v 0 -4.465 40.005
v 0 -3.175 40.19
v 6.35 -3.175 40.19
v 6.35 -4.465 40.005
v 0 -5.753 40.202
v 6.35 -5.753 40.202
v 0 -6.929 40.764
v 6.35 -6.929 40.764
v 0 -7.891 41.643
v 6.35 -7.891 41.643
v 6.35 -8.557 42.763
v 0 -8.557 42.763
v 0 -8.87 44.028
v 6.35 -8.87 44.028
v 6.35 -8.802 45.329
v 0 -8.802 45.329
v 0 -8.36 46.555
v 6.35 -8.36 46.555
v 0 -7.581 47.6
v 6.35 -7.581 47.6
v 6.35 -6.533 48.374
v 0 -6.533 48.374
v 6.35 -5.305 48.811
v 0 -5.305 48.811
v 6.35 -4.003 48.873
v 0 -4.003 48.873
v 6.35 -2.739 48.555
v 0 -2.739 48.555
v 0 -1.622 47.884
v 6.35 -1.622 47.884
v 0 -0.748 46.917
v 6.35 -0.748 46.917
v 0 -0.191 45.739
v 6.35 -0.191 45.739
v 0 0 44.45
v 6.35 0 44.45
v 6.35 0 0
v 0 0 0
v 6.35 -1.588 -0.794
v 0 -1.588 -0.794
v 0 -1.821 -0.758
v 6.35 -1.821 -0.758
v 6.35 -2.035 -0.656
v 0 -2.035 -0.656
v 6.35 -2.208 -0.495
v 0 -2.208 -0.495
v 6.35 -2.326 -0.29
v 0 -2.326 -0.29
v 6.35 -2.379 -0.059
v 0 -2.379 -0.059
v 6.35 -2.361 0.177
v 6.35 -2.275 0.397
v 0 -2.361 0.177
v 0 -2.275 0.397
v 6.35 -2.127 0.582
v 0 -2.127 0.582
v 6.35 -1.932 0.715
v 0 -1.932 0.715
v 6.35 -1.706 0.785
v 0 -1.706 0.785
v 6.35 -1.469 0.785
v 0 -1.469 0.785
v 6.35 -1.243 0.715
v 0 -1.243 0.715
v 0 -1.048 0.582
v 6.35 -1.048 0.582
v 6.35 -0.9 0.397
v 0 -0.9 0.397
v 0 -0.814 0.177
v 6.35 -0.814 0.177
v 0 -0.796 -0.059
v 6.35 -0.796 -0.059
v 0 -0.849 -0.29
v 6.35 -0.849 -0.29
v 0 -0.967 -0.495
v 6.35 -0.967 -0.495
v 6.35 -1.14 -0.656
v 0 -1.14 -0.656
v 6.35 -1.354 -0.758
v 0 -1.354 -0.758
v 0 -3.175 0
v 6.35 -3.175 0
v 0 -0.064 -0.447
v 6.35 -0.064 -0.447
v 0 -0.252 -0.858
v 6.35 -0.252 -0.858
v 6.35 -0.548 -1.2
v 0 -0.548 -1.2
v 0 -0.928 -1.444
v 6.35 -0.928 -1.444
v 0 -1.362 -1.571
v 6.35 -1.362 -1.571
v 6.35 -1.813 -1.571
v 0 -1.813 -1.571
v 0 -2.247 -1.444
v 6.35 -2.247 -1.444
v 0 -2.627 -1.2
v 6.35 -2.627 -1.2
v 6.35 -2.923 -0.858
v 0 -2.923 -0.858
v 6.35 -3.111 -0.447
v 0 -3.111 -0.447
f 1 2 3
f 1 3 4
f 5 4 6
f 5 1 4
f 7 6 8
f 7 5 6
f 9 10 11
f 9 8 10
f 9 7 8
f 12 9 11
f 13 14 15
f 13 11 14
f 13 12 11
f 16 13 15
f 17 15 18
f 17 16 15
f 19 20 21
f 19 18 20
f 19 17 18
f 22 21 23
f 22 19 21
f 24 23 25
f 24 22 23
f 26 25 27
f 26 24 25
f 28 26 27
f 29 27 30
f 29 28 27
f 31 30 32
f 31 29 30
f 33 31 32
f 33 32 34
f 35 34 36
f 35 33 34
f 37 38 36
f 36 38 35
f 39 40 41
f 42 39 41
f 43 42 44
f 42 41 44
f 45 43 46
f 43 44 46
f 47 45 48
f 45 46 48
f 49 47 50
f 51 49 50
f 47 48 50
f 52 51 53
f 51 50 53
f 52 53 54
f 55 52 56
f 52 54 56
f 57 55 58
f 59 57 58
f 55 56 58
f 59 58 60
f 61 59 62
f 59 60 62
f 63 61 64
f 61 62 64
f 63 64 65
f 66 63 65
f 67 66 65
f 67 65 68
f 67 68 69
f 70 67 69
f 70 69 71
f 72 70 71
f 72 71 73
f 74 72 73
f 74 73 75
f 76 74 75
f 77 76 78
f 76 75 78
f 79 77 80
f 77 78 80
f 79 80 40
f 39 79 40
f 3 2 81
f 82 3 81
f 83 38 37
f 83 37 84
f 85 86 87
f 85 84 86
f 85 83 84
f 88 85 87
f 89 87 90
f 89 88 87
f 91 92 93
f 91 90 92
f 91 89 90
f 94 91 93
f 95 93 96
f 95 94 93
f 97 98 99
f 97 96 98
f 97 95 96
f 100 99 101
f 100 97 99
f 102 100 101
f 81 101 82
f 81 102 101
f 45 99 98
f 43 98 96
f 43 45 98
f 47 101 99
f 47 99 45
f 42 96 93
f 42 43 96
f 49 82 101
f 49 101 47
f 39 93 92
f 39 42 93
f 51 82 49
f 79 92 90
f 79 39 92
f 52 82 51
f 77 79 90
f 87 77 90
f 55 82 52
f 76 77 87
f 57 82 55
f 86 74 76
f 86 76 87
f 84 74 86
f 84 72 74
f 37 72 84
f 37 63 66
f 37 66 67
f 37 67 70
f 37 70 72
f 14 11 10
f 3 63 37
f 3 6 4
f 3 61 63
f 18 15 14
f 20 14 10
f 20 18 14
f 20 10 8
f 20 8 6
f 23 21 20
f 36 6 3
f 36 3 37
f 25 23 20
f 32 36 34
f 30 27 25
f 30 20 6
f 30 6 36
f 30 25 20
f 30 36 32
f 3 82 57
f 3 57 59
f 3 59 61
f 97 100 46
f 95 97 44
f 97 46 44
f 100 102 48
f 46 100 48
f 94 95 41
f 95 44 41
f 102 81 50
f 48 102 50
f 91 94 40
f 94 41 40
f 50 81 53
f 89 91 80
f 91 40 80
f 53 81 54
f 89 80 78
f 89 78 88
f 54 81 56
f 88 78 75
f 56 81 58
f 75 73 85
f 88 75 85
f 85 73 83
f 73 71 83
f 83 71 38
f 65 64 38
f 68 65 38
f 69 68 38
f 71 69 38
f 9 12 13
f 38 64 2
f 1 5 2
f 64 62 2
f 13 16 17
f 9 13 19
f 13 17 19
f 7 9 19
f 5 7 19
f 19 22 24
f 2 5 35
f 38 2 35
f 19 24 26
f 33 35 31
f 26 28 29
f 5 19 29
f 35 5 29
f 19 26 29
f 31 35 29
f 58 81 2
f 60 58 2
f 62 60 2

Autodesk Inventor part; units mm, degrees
ref_plane "YZ Plane" through (0, 0, 0) normal (1, 0, 0) x (0, 1, 0)
ref_plane "XZ Plane" through (0, 0, 0) normal (0, 1, 0) x (-1, 0, 0)
ref_plane "XY Plane" through (0, 0, 0) normal (0, 0, 1) x (1, 0, 0)
sketch "Sketch1" plane through (0, 0, 0) normal (1, 0, 0) x (0, 1, 0)
  line L0 (0, 0) -> (0, 44.45)
  arc A0 (0, 44.45) -> (-3.175, 40.1903) centre (-4.445, 44.45) ccw
  line L1 (-3.175, 40.1903) -> (-3.175, 0)
  line L2 (-3.175, 0) -> (0, 0)
  circle A1 centre (-1.5875, 0) radius 1.5875
  dimension "d0" = 3.175
  dimension "d1" = 44.45
  dimension "d2" = 4.445
extrude "Extrusion1" add sketch "Sketch1" along normal blind 6.35
sketch "Sketch2" plane through (6.35, 0, 0) normal (1, 0, 0) x (0, 0, -1)
  arc A0 (0, -3.175) -> (0, 0) centre (0, -1.5875) ccw projected
hole "Hole1" at (6.35, -1.5875, 0) direction (-1, 0, 0) diameter 1.5875 end through all
properties part number "Arm" material "Lead"
